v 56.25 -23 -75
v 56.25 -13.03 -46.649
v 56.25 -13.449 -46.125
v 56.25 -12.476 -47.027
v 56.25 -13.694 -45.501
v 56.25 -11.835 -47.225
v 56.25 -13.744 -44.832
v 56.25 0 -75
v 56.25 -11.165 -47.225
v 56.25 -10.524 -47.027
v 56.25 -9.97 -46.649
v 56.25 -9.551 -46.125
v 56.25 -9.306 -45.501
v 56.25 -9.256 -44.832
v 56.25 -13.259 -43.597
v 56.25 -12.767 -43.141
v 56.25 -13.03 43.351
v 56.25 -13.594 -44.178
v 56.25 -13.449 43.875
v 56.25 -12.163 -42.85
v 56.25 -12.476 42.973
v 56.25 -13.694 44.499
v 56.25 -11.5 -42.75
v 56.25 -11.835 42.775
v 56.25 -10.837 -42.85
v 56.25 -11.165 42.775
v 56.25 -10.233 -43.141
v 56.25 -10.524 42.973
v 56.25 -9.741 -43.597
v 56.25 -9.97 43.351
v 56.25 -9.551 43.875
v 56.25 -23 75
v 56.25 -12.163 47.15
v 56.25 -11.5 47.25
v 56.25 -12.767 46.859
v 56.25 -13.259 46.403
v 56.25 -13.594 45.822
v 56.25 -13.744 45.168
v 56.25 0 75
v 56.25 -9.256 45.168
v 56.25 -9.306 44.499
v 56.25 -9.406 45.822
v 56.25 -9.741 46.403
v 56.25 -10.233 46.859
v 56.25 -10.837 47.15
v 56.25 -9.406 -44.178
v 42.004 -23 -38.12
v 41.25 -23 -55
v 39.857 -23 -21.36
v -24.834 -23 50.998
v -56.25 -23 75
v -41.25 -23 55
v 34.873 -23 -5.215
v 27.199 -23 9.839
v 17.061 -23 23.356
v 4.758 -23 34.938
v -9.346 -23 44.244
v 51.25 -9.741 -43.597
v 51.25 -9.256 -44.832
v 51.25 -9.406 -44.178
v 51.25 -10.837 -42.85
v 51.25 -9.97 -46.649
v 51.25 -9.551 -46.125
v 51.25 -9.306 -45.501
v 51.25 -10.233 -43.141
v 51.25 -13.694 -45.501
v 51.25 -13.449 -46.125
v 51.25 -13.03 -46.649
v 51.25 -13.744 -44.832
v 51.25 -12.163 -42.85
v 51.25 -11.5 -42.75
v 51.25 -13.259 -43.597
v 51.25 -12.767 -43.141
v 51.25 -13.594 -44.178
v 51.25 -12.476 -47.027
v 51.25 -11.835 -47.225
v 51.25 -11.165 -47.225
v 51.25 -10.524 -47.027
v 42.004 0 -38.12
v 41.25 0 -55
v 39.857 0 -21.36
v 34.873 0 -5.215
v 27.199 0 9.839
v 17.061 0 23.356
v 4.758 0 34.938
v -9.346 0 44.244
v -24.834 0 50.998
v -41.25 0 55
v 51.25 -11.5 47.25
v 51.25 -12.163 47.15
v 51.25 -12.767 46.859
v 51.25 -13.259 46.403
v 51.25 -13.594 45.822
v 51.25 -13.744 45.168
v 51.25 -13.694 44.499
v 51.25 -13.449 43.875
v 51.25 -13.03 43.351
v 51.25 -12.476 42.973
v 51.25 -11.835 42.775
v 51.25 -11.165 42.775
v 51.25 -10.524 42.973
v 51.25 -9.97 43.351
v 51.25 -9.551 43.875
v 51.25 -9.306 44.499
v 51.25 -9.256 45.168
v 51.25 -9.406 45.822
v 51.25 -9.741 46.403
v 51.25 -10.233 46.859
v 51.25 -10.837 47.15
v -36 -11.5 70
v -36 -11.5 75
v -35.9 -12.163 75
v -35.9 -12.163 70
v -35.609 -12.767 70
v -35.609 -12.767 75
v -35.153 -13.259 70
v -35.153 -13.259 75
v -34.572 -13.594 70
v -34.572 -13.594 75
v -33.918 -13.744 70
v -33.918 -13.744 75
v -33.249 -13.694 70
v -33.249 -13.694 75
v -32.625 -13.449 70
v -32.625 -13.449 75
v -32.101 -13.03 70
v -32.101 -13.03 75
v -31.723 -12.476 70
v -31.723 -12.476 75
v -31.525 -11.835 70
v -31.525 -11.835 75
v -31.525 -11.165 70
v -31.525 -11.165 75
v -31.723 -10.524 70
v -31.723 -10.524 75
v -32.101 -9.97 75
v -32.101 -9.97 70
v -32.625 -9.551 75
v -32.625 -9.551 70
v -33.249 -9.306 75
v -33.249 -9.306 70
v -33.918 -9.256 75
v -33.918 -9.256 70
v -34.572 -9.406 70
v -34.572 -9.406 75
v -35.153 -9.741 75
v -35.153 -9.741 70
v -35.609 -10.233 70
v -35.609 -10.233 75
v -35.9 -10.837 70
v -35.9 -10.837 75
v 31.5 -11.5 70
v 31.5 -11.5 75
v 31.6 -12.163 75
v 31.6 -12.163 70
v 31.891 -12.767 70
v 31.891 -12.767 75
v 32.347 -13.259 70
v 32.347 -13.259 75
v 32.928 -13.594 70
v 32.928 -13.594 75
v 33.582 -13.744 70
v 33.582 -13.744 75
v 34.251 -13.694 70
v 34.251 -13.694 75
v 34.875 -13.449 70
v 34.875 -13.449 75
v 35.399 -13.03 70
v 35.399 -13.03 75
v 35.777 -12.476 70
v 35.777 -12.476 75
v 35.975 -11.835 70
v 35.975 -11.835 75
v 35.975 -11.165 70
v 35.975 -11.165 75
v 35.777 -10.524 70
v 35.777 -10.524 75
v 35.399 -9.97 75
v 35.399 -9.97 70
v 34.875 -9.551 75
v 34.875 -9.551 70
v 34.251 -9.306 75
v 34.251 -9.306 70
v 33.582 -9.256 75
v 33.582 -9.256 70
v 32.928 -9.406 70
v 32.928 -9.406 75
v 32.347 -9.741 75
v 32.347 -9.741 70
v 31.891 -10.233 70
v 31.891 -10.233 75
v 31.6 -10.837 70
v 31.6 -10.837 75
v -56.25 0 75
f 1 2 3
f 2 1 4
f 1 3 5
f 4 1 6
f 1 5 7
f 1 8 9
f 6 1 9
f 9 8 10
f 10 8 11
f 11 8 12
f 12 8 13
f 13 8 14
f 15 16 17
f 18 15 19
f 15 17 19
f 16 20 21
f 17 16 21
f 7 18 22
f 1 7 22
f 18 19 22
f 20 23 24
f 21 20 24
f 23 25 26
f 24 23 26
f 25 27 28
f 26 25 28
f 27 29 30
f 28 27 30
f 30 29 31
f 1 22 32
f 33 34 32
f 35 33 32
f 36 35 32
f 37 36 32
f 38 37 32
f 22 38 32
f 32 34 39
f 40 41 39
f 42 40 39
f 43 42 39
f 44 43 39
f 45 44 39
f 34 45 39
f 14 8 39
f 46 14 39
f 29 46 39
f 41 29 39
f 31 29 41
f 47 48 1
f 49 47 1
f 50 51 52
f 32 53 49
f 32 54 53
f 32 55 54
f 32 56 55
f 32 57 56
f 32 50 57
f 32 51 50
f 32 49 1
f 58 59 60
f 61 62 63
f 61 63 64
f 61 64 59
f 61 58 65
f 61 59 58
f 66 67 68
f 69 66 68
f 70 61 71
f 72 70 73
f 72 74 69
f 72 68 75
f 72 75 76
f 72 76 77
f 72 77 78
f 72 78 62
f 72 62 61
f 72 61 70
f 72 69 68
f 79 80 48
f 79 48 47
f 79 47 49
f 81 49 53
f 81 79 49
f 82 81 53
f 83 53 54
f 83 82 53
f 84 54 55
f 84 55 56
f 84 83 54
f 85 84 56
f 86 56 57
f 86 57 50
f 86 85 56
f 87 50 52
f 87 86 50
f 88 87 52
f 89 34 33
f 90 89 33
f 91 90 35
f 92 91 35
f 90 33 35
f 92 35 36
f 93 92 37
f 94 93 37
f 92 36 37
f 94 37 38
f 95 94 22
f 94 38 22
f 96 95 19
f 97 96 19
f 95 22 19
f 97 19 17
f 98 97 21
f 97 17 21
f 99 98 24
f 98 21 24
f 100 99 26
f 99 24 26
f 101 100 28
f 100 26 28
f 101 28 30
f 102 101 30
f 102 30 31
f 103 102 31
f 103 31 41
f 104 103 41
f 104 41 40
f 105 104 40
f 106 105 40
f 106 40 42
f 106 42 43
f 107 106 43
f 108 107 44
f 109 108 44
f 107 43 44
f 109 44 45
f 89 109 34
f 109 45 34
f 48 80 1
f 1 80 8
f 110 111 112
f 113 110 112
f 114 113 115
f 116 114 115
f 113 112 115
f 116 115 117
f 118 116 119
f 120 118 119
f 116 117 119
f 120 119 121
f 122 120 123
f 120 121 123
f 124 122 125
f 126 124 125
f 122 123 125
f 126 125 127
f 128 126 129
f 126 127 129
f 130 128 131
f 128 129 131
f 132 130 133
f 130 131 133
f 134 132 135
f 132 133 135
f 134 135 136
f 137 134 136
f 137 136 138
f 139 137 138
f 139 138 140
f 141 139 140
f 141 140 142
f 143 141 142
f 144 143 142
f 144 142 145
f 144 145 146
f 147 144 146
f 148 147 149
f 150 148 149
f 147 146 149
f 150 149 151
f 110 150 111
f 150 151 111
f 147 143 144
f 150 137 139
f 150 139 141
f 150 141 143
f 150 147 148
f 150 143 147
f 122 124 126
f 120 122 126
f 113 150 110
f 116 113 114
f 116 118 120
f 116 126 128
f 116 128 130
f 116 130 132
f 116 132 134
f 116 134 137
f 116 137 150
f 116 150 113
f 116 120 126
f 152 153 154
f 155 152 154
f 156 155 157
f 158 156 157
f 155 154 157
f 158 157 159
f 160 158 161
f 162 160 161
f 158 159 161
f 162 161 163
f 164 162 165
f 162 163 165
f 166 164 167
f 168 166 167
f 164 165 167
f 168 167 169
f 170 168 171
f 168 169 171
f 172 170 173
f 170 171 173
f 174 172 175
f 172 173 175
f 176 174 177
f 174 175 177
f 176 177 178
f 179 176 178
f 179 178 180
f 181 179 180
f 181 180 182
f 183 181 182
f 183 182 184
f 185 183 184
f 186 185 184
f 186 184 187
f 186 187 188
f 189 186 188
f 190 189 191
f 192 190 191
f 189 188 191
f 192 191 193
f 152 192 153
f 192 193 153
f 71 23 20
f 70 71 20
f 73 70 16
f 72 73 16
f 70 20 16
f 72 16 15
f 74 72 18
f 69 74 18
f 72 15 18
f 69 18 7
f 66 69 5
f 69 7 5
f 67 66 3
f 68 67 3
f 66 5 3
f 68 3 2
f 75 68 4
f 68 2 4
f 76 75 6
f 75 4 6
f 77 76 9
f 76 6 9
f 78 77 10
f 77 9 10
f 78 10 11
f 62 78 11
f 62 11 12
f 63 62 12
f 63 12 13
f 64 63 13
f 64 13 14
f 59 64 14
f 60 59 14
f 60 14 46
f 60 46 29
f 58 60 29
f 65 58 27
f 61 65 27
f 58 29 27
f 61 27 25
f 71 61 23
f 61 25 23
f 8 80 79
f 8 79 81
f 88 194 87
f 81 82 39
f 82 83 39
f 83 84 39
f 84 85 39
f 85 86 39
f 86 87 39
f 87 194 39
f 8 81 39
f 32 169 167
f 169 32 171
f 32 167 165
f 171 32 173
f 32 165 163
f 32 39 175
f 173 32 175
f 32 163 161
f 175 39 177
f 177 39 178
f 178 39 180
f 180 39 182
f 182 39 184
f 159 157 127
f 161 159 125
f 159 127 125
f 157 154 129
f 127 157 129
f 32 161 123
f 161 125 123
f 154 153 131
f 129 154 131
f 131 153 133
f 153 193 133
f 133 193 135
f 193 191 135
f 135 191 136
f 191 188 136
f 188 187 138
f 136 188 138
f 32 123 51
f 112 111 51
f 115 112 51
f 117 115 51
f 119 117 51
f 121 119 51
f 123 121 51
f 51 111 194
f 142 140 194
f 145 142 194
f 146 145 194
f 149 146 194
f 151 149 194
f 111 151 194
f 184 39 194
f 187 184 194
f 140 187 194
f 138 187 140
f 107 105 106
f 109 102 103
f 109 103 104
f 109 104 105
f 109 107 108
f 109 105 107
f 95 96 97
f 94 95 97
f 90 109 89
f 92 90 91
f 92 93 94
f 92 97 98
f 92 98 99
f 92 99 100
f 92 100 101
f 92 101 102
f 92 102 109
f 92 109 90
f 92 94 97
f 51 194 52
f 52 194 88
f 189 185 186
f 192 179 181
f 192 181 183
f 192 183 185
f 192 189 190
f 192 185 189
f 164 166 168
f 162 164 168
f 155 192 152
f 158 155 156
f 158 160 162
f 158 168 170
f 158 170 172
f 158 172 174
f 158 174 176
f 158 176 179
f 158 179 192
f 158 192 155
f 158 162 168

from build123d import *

# Parameters (mm, degrees)
PAD001_DEPTH    = 23
SKETCH003_R     = 2.25
POCKET_DEPTH    = 5
SKETCH004_R     = 2.25
POCKET001_DEPTH = 5


with BuildPart() as part:
    # Sketch001 → Pad001 (new body)
    with BuildSketch(Plane.XZ):
        with BuildLine():
            Line((56.25, -75), (56.25, 75))
            Line((56.25, 75), (-56.25, 75))
            Line((-56.25, 75), (-41.25, 55))
            ThreePointArc((41.25, -55), (22.420595, 16.815446), (-41.25, 55))
            Line((41.25, -55), (56.25, -75))
        make_face()
    extrude(amount=PAD001_DEPTH)

    # Sketch003 (on Face2 of Pad001) → Pocket (cut)
    with BuildSketch(Plane(origin=(56.25, 0, 0), x_dir=(0, 0, 1), z_dir=(1, 0, 0))):
        with Locations((-45, 11.5)):
            Circle(SKETCH003_R)
        with Locations((45, 11.5)):
            Circle(SKETCH003_R)
    extrude(amount=-POCKET_DEPTH, mode=Mode.SUBTRACT)

    # Sketch004 (on Face7 of Pocket) → Pocket001 (cut)
    with BuildSketch(Plane(origin=(0, 0, 75), x_dir=(-1, 0, 0), z_dir=(0, 0, 1))):
        with Locations((-33.75, 11.5)):
            Circle(SKETCH004_R)
        with Locations((33.75, 11.5)):
            Circle(SKETCH004_R)
    extrude(amount=-POCKET001_DEPTH, mode=Mode.SUBTRACT)


solid = part.part
